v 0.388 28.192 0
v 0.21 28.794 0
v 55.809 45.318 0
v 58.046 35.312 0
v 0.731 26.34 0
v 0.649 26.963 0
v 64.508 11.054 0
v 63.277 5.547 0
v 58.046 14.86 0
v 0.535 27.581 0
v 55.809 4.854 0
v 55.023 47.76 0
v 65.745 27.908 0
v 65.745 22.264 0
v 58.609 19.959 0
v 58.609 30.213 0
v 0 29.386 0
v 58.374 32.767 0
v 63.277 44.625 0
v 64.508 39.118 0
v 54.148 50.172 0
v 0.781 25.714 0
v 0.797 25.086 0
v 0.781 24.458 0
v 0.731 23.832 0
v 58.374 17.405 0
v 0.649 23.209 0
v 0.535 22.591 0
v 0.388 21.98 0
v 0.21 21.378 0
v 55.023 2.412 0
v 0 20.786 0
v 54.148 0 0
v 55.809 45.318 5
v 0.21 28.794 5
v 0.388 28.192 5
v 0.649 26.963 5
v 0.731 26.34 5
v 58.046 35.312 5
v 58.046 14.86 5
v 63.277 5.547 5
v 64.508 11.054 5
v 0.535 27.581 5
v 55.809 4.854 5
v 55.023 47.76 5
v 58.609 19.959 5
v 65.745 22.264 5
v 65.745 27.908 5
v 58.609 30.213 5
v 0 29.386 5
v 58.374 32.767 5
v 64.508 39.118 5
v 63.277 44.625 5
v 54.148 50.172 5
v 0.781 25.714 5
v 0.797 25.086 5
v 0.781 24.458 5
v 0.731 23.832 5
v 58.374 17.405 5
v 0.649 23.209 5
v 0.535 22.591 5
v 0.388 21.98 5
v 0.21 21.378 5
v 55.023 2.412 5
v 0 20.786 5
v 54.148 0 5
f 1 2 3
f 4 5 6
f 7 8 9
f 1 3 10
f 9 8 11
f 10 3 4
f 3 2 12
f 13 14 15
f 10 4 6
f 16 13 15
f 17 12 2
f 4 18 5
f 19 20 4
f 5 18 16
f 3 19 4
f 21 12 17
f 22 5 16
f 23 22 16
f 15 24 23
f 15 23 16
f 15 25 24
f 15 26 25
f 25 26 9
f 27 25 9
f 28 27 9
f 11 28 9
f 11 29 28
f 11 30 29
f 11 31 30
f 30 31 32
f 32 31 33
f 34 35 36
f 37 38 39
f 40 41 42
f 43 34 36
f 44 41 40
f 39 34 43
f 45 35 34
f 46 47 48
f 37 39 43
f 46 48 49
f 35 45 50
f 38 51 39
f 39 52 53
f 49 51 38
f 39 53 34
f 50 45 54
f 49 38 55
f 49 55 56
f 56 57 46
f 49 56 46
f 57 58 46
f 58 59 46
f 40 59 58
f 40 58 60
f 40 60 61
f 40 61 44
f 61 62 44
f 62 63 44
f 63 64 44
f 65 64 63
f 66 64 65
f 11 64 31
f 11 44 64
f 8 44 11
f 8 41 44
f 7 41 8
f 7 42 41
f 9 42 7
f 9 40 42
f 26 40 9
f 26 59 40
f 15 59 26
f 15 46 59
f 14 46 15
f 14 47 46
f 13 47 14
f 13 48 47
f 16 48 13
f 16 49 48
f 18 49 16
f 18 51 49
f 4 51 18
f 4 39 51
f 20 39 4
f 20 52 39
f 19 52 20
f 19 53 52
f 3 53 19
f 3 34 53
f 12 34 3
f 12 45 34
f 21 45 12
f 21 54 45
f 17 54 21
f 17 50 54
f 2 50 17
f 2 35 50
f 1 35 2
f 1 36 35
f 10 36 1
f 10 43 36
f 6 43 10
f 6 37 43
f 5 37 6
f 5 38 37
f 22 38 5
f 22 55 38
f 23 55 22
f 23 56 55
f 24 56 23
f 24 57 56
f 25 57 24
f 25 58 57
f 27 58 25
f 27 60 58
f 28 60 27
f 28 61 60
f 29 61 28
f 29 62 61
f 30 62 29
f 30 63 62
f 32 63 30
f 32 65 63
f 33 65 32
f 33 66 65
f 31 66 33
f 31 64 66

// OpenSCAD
$fn = 32;

// ----------------------------------------------------------------------
// Gear sector: 3 teeth on 42 degrees
// ----------------------------------------------------------------------

// --- parameters (mm) ---
sector_angle = 42;        // sector angle, degrees
root_r = 70;              // root circle radius
tooth_h = 7;              // tooth height over the root circle
teeth = 3;                // number of teeth on the sector
hub_r = 12;               // hub bore radius
plate_t = 5;              // sector thickness, Z
arc_step = 3;             // sampling step of the root/hub arcs, degrees

tip_r = root_r + tooth_h;  // tip circle radius

profile = [[54.148, 0], [55.023, 2.412], [55.809, 4.854], [63.277, 5.547], [64.508, 11.054], [58.046, 14.86], [58.374, 17.405], [58.609, 19.959], [65.745, 22.264], [65.745, 27.908], [58.609, 30.213], [58.374, 32.767], [58.046, 35.312], [64.508, 39.118], [63.277, 44.625], [55.809, 45.318], [55.023, 47.76], [54.148, 50.172], [0, 29.386], [0.21, 28.794], [0.388, 28.192], [0.535, 27.581], [0.649, 26.963], [0.731, 26.34], [0.781, 25.714], [0.797, 25.086], [0.781, 24.458], [0.731, 23.832], [0.649, 23.209], [0.535, 22.591], [0.388, 21.98], [0.21, 21.378], [0, 20.786]];  // primary outline, 33 points, counter clockwise

// --- the one profile operation ---
linear_extrude(height = plate_t) polygon(points = profile);
